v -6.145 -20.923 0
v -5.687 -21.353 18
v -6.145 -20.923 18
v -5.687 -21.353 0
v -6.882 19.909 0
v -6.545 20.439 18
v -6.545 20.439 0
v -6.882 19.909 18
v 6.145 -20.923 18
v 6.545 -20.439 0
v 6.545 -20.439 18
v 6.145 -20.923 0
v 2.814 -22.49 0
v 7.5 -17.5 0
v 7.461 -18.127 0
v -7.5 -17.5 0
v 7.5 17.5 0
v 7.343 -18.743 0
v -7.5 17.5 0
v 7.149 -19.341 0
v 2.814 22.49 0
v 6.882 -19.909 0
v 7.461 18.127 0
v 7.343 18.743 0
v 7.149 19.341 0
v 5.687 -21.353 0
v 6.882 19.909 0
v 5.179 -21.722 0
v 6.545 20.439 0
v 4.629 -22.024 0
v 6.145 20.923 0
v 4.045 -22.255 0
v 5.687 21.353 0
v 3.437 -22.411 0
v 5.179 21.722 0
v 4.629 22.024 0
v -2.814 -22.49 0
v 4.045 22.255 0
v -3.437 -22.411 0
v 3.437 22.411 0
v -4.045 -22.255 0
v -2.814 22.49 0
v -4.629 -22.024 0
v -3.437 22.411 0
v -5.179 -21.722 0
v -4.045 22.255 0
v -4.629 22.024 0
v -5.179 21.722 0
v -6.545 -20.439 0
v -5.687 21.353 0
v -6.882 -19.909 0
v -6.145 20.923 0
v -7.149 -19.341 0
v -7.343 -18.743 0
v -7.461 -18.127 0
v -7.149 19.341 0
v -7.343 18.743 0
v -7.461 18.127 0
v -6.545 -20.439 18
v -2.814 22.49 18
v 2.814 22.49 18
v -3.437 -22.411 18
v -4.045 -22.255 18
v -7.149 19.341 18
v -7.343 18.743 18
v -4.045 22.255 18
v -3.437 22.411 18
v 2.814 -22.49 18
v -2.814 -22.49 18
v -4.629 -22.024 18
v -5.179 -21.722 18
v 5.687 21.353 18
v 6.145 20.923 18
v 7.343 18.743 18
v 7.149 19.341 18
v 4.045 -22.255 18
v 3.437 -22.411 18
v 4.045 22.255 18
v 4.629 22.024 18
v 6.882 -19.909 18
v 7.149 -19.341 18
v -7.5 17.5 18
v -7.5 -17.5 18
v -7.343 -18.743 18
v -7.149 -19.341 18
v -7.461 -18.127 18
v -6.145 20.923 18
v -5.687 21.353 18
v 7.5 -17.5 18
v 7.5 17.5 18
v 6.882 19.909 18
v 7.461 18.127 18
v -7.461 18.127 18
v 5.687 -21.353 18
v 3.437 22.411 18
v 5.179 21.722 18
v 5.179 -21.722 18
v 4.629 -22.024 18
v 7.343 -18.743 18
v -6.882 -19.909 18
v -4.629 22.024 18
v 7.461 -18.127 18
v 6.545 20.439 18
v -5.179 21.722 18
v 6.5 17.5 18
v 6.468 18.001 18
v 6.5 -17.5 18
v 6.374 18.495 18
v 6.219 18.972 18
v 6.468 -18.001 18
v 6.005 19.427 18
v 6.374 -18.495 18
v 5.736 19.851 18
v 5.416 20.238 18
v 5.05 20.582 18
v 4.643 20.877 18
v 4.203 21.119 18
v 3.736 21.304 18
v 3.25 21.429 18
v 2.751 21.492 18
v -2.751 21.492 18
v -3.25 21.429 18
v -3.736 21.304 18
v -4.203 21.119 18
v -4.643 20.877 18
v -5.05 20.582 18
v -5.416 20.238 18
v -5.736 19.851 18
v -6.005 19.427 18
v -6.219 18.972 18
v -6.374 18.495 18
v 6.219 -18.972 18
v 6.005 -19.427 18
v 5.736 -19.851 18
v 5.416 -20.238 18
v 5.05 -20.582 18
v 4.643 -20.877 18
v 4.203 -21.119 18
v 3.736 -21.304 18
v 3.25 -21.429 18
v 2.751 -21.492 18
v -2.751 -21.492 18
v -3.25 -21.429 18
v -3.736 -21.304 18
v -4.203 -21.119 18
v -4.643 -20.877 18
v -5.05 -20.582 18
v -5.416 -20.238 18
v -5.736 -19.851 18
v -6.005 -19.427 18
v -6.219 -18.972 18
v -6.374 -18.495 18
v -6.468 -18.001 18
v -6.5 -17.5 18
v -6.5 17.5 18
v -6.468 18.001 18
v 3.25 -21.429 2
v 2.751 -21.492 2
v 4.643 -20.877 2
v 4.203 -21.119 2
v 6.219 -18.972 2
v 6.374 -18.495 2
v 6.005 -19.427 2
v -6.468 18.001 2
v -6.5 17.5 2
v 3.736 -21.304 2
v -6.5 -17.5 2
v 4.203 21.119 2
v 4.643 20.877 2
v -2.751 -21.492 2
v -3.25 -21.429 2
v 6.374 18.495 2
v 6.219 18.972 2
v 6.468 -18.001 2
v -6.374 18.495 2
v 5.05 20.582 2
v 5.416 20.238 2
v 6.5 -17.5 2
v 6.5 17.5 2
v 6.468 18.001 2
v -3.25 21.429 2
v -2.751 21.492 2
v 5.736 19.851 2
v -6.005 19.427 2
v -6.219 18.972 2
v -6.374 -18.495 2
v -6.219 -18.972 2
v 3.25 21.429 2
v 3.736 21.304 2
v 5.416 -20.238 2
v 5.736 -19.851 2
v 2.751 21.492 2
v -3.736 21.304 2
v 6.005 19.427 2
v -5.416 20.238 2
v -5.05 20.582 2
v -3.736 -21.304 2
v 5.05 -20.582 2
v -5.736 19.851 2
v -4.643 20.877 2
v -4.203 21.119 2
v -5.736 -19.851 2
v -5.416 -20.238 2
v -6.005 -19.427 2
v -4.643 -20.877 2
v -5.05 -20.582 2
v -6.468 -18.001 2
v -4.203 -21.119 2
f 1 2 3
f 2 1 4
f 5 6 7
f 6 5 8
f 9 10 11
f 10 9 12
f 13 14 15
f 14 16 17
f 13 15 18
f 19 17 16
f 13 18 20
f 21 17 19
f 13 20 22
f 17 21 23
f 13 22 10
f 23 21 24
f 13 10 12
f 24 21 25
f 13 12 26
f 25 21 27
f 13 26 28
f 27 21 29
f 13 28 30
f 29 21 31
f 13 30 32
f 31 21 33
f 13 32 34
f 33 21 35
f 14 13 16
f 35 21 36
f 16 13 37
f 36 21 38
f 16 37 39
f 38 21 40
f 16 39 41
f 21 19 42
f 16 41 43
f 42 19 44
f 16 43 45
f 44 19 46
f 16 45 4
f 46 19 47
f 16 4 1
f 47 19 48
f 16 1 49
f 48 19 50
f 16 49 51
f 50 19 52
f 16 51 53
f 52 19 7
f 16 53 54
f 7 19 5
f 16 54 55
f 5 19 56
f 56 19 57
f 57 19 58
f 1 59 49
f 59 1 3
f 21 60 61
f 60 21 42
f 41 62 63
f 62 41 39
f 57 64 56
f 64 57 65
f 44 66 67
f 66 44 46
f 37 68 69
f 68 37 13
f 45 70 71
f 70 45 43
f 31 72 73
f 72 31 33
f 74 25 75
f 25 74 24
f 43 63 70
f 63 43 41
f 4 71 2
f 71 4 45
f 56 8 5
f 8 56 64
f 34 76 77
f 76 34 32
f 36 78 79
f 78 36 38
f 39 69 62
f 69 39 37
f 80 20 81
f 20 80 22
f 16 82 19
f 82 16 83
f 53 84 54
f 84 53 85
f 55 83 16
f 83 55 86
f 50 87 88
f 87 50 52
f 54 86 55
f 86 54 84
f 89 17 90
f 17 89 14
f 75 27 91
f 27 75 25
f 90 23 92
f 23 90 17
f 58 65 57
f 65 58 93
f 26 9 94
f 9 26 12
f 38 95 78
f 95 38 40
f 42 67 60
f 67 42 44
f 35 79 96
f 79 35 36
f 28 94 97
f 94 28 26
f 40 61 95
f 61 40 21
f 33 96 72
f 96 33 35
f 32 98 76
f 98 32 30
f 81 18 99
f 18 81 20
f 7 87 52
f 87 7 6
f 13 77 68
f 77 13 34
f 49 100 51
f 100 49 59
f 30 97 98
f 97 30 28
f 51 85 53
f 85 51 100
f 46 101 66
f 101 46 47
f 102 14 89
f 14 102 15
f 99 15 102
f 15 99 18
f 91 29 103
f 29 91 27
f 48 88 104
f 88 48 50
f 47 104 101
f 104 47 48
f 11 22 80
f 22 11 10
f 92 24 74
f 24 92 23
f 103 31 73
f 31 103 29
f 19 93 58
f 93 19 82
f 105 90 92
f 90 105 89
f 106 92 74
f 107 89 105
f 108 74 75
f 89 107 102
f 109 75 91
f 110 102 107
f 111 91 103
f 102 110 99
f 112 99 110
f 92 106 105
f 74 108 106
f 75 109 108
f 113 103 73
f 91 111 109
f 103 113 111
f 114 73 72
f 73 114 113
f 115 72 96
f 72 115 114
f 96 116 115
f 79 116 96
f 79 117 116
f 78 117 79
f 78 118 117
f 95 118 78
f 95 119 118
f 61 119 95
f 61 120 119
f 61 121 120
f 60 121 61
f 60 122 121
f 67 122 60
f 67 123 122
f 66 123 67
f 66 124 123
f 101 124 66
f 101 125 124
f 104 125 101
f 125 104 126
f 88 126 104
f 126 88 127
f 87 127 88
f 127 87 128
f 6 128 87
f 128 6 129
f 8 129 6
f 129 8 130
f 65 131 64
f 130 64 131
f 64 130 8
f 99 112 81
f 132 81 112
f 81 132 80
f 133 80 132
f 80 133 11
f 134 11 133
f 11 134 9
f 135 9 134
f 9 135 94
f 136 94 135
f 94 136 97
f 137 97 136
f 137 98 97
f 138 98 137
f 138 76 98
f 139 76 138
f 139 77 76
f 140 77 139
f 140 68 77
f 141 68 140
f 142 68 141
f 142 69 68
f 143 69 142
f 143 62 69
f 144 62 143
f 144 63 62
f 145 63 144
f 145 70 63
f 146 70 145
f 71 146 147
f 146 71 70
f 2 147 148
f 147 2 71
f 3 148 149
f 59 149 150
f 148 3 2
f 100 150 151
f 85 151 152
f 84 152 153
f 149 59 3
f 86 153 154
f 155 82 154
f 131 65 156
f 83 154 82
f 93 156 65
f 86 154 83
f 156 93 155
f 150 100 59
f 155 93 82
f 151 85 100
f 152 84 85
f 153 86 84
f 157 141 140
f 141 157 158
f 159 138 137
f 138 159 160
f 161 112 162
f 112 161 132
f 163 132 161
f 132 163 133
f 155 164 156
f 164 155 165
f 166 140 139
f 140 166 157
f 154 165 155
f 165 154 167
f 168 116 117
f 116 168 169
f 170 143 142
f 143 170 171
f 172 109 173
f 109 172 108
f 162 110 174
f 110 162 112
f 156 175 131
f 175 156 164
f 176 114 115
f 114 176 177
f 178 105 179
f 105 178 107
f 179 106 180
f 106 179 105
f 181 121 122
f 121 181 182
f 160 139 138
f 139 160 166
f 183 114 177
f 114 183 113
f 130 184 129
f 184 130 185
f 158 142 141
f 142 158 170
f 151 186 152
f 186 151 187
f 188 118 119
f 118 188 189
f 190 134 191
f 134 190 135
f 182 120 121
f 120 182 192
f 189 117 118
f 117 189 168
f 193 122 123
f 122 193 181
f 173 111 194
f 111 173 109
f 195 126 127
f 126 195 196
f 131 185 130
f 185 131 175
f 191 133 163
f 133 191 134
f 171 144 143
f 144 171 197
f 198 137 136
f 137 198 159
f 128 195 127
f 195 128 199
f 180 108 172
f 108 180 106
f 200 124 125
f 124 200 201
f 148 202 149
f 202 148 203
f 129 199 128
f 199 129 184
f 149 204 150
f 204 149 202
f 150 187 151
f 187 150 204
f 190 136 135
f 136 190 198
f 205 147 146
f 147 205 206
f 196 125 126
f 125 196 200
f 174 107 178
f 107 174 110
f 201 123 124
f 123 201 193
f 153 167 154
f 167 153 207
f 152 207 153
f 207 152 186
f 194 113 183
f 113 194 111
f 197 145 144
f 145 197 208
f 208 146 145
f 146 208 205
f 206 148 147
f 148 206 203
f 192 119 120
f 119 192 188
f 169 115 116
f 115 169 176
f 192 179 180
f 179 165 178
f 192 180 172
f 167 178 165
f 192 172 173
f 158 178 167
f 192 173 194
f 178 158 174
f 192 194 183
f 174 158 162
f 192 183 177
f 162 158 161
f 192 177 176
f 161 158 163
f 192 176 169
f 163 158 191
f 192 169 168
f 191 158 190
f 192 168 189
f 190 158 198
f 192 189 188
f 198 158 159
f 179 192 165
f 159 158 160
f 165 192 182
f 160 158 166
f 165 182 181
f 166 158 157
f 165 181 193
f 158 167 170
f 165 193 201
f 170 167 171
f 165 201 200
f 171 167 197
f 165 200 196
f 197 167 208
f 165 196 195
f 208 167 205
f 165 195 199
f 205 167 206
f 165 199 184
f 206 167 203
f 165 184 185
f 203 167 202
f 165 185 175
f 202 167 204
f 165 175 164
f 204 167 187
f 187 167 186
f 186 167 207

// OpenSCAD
$fn = 50;


difference() {
	union() {
		hull() {
			translate(v = [-2.5000000000, 17.5000000000, 0]) {
				cylinder(h = 18, r = 5);
			}
			translate(v = [2.5000000000, 17.5000000000, 0]) {
				cylinder(h = 18, r = 5);
			}
			translate(v = [-2.5000000000, -17.5000000000, 0]) {
				cylinder(h = 18, r = 5);
			}
			translate(v = [2.5000000000, -17.5000000000, 0]) {
				cylinder(h = 18, r = 5);
			}
		}
	}
	union() {
		translate(v = [0, 0, 2]) {
			hull() {
				translate(v = [-2.5000000000, 17.5000000000, 0]) {
					cylinder(h = 16, r = 4);
				}
				translate(v = [2.5000000000, 17.5000000000, 0]) {
					cylinder(h = 16, r = 4);
				}
				translate(v = [-2.5000000000, -17.5000000000, 0]) {
					cylinder(h = 16, r = 4);
				}
				translate(v = [2.5000000000, -17.5000000000, 0]) {
					cylinder(h = 16, r = 4);
				}
			}
		}
	}
}
